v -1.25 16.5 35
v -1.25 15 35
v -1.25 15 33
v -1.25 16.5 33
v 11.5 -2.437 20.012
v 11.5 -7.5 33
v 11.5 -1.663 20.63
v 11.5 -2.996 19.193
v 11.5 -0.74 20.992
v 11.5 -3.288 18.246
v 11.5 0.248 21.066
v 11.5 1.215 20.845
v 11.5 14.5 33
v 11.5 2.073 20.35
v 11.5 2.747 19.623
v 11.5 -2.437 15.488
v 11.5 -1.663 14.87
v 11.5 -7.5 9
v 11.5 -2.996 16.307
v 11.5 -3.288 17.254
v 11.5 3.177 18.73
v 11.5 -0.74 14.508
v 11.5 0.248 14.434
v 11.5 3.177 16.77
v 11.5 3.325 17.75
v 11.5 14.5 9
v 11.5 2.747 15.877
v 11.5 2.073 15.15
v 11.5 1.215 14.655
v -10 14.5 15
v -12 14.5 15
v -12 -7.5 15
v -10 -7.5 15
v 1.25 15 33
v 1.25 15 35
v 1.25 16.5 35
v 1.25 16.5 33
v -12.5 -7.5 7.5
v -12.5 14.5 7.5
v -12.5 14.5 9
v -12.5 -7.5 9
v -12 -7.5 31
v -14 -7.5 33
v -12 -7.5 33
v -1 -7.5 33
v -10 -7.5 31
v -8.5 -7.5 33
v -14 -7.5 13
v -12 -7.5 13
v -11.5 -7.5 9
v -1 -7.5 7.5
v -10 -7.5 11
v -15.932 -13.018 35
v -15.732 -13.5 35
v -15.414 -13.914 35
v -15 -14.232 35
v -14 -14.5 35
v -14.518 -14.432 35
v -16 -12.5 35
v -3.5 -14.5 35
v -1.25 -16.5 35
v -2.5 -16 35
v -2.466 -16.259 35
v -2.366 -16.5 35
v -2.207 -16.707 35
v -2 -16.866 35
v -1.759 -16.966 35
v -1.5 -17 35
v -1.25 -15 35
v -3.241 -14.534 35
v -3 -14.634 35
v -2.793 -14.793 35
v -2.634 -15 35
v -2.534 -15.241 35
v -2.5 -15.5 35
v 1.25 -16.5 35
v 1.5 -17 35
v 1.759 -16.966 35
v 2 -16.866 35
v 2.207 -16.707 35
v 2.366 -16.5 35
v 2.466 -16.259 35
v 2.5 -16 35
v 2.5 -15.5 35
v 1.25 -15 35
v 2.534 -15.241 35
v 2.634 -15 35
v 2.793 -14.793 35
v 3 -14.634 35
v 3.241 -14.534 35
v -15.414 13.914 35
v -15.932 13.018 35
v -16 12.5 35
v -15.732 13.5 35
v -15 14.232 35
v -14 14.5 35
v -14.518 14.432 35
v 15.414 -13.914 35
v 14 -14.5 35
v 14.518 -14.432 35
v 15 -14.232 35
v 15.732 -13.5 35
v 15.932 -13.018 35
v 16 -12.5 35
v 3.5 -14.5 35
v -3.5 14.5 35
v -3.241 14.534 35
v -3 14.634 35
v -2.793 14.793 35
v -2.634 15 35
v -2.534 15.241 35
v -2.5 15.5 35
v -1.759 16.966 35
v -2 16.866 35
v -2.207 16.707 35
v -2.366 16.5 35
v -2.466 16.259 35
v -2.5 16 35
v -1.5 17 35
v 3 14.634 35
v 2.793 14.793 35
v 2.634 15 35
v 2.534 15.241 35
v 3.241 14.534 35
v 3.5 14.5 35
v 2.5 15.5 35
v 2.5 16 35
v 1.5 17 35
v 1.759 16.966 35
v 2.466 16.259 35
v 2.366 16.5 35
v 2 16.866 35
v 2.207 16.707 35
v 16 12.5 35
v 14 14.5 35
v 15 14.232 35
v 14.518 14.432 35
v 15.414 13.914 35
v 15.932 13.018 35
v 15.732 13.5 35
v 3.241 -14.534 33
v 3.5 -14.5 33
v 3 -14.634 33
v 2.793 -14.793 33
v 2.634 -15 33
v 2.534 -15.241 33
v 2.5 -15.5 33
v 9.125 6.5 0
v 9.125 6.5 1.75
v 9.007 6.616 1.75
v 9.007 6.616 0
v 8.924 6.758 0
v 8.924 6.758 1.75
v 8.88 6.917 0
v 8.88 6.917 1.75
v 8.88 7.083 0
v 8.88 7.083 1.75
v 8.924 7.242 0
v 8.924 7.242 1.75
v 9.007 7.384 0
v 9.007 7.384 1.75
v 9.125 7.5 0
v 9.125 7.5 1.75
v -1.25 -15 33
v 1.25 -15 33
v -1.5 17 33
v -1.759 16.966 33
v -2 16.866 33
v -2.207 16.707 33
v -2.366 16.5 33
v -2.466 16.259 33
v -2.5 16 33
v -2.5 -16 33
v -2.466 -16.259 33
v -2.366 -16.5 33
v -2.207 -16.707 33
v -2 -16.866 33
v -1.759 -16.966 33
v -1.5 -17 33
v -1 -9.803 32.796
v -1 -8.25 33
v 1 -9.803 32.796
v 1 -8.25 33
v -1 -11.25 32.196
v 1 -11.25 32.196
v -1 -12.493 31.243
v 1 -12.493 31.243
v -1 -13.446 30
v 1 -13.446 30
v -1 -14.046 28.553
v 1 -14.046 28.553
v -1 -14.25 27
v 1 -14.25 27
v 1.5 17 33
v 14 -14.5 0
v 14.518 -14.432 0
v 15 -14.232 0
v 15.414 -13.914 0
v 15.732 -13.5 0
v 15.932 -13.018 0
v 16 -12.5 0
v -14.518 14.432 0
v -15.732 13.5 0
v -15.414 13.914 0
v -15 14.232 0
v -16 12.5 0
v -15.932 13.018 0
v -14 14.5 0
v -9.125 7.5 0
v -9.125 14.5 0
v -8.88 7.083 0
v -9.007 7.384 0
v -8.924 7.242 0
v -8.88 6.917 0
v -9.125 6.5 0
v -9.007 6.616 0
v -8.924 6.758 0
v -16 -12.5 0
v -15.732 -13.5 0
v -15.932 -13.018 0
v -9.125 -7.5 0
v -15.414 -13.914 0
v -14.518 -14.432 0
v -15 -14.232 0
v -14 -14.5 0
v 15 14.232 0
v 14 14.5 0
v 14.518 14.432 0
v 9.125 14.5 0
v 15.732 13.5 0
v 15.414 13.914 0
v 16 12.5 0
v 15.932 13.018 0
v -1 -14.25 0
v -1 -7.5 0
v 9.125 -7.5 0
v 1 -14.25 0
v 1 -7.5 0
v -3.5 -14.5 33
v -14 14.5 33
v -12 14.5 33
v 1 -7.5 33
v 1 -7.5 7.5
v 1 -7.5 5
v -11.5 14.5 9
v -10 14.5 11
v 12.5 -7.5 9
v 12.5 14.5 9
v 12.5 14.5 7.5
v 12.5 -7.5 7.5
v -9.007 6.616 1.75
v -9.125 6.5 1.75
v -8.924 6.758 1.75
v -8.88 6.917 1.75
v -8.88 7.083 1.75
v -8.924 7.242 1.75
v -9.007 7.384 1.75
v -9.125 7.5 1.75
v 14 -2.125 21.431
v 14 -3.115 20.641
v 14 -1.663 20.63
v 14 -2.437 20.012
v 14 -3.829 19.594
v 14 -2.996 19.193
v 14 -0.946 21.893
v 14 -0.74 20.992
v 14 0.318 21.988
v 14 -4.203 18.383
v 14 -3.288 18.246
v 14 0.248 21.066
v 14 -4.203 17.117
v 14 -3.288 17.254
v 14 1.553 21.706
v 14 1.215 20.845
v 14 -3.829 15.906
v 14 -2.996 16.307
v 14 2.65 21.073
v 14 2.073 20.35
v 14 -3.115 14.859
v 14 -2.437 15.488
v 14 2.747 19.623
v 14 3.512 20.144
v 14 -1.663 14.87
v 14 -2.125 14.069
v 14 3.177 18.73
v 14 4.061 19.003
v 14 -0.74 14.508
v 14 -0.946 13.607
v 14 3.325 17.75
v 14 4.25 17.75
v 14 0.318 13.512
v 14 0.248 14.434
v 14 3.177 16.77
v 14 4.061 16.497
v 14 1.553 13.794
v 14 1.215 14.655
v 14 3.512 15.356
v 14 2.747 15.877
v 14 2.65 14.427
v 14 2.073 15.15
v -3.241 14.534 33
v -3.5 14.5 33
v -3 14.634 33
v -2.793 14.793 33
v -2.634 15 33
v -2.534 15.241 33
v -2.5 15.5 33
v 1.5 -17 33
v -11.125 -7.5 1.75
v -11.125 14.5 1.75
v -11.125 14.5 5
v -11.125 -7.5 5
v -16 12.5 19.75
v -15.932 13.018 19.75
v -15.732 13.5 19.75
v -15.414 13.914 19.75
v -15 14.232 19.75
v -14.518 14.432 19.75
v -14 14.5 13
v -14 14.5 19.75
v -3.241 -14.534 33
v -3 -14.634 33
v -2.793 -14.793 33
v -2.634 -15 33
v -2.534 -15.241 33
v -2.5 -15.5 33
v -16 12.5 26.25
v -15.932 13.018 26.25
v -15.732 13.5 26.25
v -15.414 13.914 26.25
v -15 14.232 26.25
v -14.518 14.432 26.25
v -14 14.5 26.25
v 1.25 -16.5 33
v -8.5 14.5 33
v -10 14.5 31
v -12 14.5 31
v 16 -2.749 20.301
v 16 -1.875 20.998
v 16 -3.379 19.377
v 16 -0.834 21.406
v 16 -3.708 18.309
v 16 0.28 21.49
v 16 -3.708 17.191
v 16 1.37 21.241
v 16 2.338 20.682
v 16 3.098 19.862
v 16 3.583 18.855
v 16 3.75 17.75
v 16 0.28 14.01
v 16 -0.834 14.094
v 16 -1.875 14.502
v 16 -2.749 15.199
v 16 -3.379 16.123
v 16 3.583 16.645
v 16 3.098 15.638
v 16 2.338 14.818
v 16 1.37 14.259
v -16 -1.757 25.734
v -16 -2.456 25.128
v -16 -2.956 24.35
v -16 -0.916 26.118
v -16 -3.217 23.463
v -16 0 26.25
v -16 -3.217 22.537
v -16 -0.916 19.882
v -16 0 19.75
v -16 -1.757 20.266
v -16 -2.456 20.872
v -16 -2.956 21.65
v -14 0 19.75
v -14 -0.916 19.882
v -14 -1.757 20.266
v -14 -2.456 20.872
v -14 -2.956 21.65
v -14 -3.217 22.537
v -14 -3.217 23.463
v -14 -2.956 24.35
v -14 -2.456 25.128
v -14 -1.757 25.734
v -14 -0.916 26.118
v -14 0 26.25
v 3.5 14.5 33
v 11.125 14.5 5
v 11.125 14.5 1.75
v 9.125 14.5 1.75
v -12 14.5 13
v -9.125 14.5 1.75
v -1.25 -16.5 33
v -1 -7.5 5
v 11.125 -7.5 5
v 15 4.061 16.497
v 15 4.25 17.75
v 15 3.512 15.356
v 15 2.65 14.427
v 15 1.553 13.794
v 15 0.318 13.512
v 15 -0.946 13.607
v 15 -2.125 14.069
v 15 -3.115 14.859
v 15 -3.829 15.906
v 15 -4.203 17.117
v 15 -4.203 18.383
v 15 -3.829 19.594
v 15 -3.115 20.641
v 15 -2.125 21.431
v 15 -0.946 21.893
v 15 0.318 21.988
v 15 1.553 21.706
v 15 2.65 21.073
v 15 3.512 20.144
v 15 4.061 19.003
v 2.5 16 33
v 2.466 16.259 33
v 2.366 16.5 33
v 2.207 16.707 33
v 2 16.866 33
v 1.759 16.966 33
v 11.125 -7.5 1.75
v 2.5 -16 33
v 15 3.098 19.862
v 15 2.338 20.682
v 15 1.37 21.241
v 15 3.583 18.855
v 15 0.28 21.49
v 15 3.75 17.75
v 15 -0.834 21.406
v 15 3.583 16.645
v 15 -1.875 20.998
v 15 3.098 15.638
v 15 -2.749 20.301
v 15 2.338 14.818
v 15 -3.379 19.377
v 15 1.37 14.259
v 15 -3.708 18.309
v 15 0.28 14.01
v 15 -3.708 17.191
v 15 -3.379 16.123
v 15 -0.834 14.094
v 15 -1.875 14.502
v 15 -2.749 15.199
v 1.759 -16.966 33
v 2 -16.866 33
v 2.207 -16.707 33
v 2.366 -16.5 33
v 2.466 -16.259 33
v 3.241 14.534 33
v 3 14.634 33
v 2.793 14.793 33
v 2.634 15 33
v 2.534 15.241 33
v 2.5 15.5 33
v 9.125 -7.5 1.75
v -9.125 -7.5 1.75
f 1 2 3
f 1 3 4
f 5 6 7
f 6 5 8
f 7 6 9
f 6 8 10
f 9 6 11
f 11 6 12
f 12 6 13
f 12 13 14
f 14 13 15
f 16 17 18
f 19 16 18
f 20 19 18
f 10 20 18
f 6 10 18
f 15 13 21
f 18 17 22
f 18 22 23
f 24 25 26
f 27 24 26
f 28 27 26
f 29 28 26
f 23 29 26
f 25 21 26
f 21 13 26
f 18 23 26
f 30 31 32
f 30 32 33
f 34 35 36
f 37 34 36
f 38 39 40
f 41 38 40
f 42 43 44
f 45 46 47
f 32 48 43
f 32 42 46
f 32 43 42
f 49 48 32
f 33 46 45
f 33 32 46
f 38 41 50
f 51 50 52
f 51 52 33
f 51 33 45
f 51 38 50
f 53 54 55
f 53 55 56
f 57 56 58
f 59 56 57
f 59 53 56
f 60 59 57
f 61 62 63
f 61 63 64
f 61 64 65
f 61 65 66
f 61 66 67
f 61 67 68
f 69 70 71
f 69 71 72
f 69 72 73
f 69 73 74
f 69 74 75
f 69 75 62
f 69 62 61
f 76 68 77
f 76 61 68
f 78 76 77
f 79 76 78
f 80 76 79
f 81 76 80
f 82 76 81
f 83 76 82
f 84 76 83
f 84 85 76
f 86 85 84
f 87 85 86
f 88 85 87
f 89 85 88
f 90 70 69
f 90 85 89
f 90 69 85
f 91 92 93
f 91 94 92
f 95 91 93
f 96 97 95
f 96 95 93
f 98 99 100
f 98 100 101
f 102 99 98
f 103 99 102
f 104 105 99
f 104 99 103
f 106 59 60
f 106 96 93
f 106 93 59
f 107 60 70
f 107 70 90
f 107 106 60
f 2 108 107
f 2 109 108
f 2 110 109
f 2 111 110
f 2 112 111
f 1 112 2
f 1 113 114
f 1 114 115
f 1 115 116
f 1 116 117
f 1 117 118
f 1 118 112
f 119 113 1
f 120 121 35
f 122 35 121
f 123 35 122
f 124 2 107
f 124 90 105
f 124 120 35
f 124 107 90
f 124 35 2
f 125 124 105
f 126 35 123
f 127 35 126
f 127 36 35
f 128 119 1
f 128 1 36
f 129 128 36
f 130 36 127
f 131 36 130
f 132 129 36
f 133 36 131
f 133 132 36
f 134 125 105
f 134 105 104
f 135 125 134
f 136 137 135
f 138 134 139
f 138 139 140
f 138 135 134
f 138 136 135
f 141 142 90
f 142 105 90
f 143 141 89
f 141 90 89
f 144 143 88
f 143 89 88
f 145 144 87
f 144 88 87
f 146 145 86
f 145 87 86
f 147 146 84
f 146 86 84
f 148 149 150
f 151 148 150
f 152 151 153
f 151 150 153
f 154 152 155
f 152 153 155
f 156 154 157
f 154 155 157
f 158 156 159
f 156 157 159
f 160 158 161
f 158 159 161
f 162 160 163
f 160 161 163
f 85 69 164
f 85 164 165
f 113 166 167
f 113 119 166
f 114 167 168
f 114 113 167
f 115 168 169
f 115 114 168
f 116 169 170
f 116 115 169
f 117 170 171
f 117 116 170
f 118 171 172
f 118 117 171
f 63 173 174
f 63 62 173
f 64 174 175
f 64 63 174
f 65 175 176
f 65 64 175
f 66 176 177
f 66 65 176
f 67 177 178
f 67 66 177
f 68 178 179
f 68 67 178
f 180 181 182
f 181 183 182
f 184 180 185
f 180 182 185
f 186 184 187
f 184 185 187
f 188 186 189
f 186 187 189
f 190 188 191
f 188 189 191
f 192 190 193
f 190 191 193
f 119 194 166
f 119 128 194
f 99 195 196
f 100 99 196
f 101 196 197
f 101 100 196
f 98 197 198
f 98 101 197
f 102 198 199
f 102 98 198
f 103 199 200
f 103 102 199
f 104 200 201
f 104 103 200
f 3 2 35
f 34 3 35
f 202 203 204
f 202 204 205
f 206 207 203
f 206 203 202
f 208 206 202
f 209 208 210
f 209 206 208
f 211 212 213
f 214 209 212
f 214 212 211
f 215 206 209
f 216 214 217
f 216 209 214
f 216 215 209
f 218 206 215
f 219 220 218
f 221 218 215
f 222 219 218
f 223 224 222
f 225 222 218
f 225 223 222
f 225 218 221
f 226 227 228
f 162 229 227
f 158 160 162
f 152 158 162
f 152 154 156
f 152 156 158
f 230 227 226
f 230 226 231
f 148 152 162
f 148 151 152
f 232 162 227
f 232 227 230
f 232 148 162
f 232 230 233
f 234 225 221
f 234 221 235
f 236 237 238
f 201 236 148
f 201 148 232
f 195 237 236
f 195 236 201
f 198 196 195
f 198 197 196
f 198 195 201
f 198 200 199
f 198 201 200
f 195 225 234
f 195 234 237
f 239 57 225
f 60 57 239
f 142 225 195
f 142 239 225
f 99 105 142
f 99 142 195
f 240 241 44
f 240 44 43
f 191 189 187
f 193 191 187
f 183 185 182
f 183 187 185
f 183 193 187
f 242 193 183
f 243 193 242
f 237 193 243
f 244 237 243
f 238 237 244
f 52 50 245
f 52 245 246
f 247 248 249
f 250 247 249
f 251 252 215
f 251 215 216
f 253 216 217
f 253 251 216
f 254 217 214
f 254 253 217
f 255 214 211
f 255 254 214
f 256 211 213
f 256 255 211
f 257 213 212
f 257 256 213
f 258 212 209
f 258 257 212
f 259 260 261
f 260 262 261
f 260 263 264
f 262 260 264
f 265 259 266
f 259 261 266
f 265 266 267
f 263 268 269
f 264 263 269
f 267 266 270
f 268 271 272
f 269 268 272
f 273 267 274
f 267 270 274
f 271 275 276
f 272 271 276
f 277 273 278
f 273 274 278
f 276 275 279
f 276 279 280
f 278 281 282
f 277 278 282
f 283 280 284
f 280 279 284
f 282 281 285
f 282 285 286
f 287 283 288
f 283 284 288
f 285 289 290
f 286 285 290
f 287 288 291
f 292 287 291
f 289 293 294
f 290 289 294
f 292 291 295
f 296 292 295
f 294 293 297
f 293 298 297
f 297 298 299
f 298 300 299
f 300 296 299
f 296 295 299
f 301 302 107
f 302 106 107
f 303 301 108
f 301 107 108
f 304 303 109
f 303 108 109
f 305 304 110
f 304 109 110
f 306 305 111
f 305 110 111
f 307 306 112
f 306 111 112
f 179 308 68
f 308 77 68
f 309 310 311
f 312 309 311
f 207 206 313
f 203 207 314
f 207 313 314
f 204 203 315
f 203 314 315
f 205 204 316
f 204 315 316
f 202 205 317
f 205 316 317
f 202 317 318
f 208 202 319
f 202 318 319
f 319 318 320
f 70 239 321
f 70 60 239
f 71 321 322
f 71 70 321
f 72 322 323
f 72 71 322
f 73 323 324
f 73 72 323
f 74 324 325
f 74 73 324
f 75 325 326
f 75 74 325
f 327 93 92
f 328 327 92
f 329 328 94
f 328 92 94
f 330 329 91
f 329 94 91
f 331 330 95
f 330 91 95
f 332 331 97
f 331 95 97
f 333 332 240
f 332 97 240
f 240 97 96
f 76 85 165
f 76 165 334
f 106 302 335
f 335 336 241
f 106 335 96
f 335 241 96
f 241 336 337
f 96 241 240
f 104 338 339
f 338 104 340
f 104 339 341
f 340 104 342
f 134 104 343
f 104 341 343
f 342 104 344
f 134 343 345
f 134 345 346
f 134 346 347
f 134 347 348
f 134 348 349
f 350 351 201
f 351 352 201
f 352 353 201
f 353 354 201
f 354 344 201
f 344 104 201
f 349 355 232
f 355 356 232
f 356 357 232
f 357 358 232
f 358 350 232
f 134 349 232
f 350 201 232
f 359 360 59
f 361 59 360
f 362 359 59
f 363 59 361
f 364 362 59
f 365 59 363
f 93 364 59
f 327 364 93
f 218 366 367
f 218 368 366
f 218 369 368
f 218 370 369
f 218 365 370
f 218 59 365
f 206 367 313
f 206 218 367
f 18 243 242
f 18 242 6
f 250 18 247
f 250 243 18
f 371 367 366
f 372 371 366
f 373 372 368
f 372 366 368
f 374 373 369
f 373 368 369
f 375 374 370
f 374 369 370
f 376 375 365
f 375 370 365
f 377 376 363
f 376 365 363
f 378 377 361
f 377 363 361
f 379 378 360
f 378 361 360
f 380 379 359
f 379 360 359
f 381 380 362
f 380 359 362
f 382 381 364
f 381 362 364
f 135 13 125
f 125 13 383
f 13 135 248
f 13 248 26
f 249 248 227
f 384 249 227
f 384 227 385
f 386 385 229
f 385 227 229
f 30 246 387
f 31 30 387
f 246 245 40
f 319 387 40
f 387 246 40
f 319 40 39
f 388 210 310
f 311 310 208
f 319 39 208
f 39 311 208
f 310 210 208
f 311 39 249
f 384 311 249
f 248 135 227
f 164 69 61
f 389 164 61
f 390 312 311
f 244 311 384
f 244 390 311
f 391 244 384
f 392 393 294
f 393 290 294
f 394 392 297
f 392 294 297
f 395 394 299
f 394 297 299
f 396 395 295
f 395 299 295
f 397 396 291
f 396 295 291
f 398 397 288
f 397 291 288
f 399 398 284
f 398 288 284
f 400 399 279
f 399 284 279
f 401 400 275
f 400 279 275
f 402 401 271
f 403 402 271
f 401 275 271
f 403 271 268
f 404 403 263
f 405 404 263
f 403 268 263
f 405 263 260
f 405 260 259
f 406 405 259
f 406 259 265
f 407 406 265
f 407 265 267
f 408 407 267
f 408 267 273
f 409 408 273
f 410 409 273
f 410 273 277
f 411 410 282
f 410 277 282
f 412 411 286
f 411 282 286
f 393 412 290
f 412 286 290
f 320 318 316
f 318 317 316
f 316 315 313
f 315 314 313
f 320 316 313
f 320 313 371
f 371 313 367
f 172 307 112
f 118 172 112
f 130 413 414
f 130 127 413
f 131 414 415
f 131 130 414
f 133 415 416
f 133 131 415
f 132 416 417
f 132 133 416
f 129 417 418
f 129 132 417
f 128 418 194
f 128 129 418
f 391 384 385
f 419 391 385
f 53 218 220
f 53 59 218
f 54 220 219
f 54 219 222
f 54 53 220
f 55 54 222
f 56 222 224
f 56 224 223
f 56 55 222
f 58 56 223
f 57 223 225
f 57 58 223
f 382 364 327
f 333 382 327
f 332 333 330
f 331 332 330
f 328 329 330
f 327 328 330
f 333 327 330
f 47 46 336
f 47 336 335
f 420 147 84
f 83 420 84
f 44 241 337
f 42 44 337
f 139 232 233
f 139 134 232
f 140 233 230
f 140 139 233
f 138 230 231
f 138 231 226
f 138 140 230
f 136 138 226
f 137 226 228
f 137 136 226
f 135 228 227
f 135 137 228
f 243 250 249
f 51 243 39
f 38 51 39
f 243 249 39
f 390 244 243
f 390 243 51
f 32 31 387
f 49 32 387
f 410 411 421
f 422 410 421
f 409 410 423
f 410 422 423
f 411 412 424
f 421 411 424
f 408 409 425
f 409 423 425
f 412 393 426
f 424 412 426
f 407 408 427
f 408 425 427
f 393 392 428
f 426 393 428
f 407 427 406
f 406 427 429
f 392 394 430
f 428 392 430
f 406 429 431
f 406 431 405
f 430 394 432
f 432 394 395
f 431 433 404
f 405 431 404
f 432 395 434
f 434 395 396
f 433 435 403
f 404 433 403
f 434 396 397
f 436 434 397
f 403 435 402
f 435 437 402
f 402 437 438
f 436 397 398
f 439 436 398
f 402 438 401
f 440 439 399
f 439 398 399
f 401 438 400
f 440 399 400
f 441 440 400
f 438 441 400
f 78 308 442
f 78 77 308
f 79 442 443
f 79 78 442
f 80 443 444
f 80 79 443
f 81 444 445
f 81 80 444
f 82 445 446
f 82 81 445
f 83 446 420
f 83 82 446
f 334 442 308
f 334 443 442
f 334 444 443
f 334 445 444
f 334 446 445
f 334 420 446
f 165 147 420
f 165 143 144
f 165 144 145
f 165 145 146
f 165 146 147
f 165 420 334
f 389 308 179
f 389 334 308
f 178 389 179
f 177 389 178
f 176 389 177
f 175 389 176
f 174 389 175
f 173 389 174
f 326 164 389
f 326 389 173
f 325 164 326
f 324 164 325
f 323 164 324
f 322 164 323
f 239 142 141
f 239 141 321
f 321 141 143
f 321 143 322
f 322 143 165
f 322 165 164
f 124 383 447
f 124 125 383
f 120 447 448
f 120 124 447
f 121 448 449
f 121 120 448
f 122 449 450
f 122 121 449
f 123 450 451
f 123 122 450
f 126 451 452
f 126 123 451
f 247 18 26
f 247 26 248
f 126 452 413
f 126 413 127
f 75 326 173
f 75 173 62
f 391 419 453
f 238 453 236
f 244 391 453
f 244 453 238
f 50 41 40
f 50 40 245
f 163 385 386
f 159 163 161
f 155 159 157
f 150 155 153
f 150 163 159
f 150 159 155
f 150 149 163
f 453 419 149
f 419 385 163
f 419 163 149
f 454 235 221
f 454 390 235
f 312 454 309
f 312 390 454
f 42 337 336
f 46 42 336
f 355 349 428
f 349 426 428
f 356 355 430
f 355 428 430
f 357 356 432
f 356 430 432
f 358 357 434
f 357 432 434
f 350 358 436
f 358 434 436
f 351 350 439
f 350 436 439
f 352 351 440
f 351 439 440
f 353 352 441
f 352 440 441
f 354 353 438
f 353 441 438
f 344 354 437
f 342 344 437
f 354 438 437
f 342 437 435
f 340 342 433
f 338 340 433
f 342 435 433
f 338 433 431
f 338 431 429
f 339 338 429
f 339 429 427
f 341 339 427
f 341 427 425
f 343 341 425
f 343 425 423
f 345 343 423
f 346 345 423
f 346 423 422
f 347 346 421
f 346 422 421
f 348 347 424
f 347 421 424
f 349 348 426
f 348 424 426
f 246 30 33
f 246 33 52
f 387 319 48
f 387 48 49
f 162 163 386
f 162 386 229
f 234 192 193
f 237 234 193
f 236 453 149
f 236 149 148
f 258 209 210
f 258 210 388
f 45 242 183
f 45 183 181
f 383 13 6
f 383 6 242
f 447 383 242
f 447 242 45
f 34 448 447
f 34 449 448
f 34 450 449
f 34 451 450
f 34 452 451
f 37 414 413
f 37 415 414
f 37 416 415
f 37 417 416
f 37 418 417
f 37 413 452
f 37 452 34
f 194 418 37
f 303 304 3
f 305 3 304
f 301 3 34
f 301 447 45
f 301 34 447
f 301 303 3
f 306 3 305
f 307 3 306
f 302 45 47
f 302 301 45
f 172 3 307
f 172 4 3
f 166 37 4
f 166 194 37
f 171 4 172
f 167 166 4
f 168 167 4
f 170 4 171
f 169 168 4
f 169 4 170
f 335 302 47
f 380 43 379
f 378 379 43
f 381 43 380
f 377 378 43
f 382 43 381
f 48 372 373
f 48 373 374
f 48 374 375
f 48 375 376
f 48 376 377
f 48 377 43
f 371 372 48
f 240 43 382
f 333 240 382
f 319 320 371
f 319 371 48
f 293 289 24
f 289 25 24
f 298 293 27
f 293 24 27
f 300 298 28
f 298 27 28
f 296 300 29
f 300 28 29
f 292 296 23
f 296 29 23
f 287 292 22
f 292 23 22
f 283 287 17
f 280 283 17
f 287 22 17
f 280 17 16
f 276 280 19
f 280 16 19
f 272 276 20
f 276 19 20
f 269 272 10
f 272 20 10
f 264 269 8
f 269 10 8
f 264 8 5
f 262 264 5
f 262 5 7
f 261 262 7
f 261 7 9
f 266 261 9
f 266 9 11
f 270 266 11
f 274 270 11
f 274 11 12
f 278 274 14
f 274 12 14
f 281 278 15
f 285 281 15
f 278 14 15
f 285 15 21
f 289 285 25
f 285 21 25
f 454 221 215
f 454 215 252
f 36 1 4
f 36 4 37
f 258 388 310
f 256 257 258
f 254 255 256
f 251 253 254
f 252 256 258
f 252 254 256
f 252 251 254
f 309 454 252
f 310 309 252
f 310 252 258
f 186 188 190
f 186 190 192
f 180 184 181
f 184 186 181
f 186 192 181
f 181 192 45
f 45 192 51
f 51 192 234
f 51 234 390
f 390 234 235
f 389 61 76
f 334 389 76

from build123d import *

# Parameters (mm, degrees)
SKETCH1_W                = 32
SKETCH1_H                = 29
BOSS_EXTRUDE1_DEPTH      = 35
FILLET1_R                = 2
SLOT_FOR_COIL_DEPTH      = 1
SLOT_FOR_COIL_DEPTH_BACK = 30
BOSS_EXTRUDE2_DEPTH      = 7
BOSS_EXTRUDE3_DEPTH      = 1.75
SKETCH5_W                = 2
SKETCH5_H                = 7
CUT_EXTRUDE2_DEPTH       = 33
CUT_EXTRUDE3_DEPTH       = 22
SKETCH7_W                = 2
SKETCH7_H                = 33
BOSS_EXTRUDE4_DEPTH      = 0.25
FILLET2_R                = 6
CUT_EXTRUDE5_DEPTH       = 4.5
SKETCH14_W               = 2.5
SKETCH14_H               = 20
CUT_EXTRUDE6_DEPTH       = 22
SKETCH16_W               = 2
SKETCH16_H               = 4
SKETCH16_H_2             = 2
BOSS_EXTRUDE5_DEPTH      = 22
BOSS_EXTRUDE6_DEPTH      = 22
SKETCH21_W               = 5
SKETCH21_H               = 2
BOSS_EXTRUDE7_DEPTH      = 2.5
SKETCH23_W               = 2.5
SKETCH23_H               = 1.5
CUT_EXTRUDE7_DEPTH       = 2
FILLET3_R                = 1


with BuildPart() as part:
    # Sketch1 → Boss-Extrude1 (new body)
    with BuildSketch(Plane.XY):
        Rectangle(SKETCH1_W, SKETCH1_H)
    extrude(amount=BOSS_EXTRUDE1_DEPTH)

    # Fillet1
    fillet1_edges = [part.edges().sort_by_distance(p)[0] for p in [
        (16, -14.5, 17.5),
        (-16, -14.5, 17.5),
        (-16, 14.5, 17.5),
        (16, 14.5, 17.5),
    ]]
    fillet(fillet1_edges, radius=FILLET1_R)

    # Sketch2 → Slot for Coil (cut, two sides)
    with BuildSketch(Plane.XZ.offset(14.5)) as slot_for_coil_sk:
        Polygon((-9.125, 0), (-9.125, 1.75), (-11.125, 1.75), (-11.125, 5), (11.125, 5), (11.125, 1.75), (9.125, 1.75), (9.125, 0), align=None)
    extrude(amount=SLOT_FOR_COIL_DEPTH, mode=Mode.SUBTRACT)
    extrude(slot_for_coil_sk.sketch, amount=-SLOT_FOR_COIL_DEPTH_BACK, mode=Mode.SUBTRACT)

    # Sketch3 → Boss-Extrude2 (add)
    with BuildSketch(Plane.XZ.offset(14.5)):
        Polygon((-9.125, 0), (-9.125, 1.75), (-11.125, 1.75), (-11.125, 5), (11.125, 5), (11.125, 1.75), (9.125, 1.75), (9.125, 0), align=None)
    extrude(amount=-BOSS_EXTRUDE2_DEPTH)

    # Sketch4 → Boss-Extrude3 (add)
    with BuildSketch(Plane(origin=(0, 0, 1.75), x_dir=(-1, 0, 0), z_dir=(0, 0, -1))):
        with BuildLine():
            Line((-9.125, 7.5), (-9.125, 6.5))
            ThreePointArc((-9.125, 6.5), (-8.875, 7), (-9.125, 7.5))
        make_face()
    boss_extrude3 = extrude(amount=BOSS_EXTRUDE3_DEPTH)

    # Mirror1: Boss-Extrude3 across plane
    add(boss_extrude3.mirror(Plane(origin=(0, 0, 0), x_dir=(0, 0, 1), z_dir=(1, 0, 0))))

    # Sketch5 → Cut-Extrude2 (cut)
    with BuildSketch(Plane(origin=(0, 0, 0), x_dir=(-1, 0, 0), z_dir=(0, 0, -1))):
        with Locations((0, -11)):
            Rectangle(SKETCH5_W, SKETCH5_H)
    extrude(amount=-CUT_EXTRUDE2_DEPTH, mode=Mode.SUBTRACT)

    # Sketch6 → Cut-Extrude3 (cut)
    with BuildSketch(Plane(origin=(0, 14.5, 0), x_dir=(1, 0, 0), z_dir=(0, 1, 0))):
        Polygon((-12.5, -7.5), (-12.5, -9), (-11.5, -9), (-11.5, -33), (11.5, -33), (11.5, -9), (12.5, -9), (12.5, -7.5), align=None)
    extrude(amount=-CUT_EXTRUDE3_DEPTH, mode=Mode.SUBTRACT)

    # Sketch7 → Boss-Extrude4 (add)
    with BuildSketch(Plane.XZ.offset(14.5)):
        with Locations((0, 16.5)):
            Rectangle(SKETCH7_W, SKETCH7_H)
    extrude(amount=-BOSS_EXTRUDE4_DEPTH)

    # Fillet2
    fillet2_edges = [part.edges().sort_by_distance(p)[0] for p in [
        (0, -14.25, 33),
    ]]
    fillet(fillet2_edges, radius=FILLET2_R)

    # Sketch9 → Cut-Revolve1 (revolve, cut)
    with BuildSketch(Plane(origin=(0, 0, 17.75), x_dir=(-1, 0, 0), z_dir=(0, 0, -1))):
        Polygon((-15, 4.25), (-14, 4.25), (-14, 3.325), (-11.5, 3.325), (-11.5, 0), (-16, 0), (-16, 3.75), (-15, 3.75), align=None)
    revolve(axis=Axis((16, 0, 17.75), (-1, 0, 0)), mode=Mode.SUBTRACT)

    # Sketch11 → Cut-Extrude5 (cut)
    with BuildSketch(Plane(origin=(-16, 0, 44), x_dir=(0, 0, -1), z_dir=(1, 0, 0))):
        with BuildLine():
            Line((24.25, 25), (24.25, 0))
            ThreePointArc((24.25, 0), (21, -3.25), (17.75, 0))
            Line((17.75, 0), (17.75, 25))
            ThreePointArc((17.75, 25), (21, 28.25), (24.25, 25))
        make_face()
    extrude(amount=CUT_EXTRUDE5_DEPTH, mode=Mode.SUBTRACT)

    # Sketch14 → Cut-Extrude6 (cut)
    with BuildSketch(Plane(origin=(0, 14.5, 0), x_dir=(1, 0, 0), z_dir=(0, 1, 0))):
        with Locations((-12.75, -23)):
            Rectangle(SKETCH14_W, SKETCH14_H)
    extrude(amount=-CUT_EXTRUDE6_DEPTH, mode=Mode.SUBTRACT)

    # Sketch16 → Boss-Extrude5 (add)
    with BuildSketch(Plane(origin=(0, 14.5, 0), x_dir=(1, 0, 0), z_dir=(0, 1, 0))):
        with Locations((-11, -13)):
            Rectangle(SKETCH16_W, SKETCH16_H)
        with Locations((-11, -32)):
            Rectangle(SKETCH16_W, SKETCH16_H_2)
    extrude(amount=-BOSS_EXTRUDE5_DEPTH)

    # Sketch20 → Boss-Extrude6 (add)
    with BuildSketch(Plane(origin=(0, 14.5, 0), x_dir=(1, 0, 0), z_dir=(0, 1, 0))):
        Polygon((-11.5, -9), (-10, -11), (-11.5, -11), align=None)
        Polygon((-10, -31), (-8.5, -33), (-10, -33), align=None)
    extrude(amount=-BOSS_EXTRUDE6_DEPTH)

    # Sketch21 → Boss-Extrude7 (add)
    with BuildSketch(Plane(origin=(0, 14.5, 0), x_dir=(-1, 0, 0), z_dir=(0, 1, 0))):
        with Locations((0, 34)):
            Rectangle(SKETCH21_W, SKETCH21_H)
    boss_extrude7 = extrude(amount=BOSS_EXTRUDE7_DEPTH)

    # Sketch23 → Cut-Extrude7 (cut)
    with BuildSketch(Plane.XY.offset(35)):
        with Locations((0, 15.75)):
            Rectangle(SKETCH23_W, SKETCH23_H)
    cut_extrude7 = extrude(amount=-CUT_EXTRUDE7_DEPTH, mode=Mode.SUBTRACT)

    # Mirror3: Boss-Extrude7, Cut-Extrude7 across plane
    add(boss_extrude7.mirror(Plane.ZX))
    add(cut_extrude7.mirror(Plane.ZX), mode=Mode.SUBTRACT)

    # Fillet3
    fillet3_edges = [part.edges().sort_by_distance(p)[0] for p in [
        (2.5, 14.5, 34),
        (-2.5, 14.5, 34),
        (2.5, 17, 34),
        (-2.5, 17, 34),
        (2.5, -17, 34),
        (-2.5, -17, 34),
        (2.5, -14.5, 34),
        (-2.5, -14.5, 34),
    ]]
    fillet(fillet3_edges, radius=FILLET3_R)


solid = part.part
